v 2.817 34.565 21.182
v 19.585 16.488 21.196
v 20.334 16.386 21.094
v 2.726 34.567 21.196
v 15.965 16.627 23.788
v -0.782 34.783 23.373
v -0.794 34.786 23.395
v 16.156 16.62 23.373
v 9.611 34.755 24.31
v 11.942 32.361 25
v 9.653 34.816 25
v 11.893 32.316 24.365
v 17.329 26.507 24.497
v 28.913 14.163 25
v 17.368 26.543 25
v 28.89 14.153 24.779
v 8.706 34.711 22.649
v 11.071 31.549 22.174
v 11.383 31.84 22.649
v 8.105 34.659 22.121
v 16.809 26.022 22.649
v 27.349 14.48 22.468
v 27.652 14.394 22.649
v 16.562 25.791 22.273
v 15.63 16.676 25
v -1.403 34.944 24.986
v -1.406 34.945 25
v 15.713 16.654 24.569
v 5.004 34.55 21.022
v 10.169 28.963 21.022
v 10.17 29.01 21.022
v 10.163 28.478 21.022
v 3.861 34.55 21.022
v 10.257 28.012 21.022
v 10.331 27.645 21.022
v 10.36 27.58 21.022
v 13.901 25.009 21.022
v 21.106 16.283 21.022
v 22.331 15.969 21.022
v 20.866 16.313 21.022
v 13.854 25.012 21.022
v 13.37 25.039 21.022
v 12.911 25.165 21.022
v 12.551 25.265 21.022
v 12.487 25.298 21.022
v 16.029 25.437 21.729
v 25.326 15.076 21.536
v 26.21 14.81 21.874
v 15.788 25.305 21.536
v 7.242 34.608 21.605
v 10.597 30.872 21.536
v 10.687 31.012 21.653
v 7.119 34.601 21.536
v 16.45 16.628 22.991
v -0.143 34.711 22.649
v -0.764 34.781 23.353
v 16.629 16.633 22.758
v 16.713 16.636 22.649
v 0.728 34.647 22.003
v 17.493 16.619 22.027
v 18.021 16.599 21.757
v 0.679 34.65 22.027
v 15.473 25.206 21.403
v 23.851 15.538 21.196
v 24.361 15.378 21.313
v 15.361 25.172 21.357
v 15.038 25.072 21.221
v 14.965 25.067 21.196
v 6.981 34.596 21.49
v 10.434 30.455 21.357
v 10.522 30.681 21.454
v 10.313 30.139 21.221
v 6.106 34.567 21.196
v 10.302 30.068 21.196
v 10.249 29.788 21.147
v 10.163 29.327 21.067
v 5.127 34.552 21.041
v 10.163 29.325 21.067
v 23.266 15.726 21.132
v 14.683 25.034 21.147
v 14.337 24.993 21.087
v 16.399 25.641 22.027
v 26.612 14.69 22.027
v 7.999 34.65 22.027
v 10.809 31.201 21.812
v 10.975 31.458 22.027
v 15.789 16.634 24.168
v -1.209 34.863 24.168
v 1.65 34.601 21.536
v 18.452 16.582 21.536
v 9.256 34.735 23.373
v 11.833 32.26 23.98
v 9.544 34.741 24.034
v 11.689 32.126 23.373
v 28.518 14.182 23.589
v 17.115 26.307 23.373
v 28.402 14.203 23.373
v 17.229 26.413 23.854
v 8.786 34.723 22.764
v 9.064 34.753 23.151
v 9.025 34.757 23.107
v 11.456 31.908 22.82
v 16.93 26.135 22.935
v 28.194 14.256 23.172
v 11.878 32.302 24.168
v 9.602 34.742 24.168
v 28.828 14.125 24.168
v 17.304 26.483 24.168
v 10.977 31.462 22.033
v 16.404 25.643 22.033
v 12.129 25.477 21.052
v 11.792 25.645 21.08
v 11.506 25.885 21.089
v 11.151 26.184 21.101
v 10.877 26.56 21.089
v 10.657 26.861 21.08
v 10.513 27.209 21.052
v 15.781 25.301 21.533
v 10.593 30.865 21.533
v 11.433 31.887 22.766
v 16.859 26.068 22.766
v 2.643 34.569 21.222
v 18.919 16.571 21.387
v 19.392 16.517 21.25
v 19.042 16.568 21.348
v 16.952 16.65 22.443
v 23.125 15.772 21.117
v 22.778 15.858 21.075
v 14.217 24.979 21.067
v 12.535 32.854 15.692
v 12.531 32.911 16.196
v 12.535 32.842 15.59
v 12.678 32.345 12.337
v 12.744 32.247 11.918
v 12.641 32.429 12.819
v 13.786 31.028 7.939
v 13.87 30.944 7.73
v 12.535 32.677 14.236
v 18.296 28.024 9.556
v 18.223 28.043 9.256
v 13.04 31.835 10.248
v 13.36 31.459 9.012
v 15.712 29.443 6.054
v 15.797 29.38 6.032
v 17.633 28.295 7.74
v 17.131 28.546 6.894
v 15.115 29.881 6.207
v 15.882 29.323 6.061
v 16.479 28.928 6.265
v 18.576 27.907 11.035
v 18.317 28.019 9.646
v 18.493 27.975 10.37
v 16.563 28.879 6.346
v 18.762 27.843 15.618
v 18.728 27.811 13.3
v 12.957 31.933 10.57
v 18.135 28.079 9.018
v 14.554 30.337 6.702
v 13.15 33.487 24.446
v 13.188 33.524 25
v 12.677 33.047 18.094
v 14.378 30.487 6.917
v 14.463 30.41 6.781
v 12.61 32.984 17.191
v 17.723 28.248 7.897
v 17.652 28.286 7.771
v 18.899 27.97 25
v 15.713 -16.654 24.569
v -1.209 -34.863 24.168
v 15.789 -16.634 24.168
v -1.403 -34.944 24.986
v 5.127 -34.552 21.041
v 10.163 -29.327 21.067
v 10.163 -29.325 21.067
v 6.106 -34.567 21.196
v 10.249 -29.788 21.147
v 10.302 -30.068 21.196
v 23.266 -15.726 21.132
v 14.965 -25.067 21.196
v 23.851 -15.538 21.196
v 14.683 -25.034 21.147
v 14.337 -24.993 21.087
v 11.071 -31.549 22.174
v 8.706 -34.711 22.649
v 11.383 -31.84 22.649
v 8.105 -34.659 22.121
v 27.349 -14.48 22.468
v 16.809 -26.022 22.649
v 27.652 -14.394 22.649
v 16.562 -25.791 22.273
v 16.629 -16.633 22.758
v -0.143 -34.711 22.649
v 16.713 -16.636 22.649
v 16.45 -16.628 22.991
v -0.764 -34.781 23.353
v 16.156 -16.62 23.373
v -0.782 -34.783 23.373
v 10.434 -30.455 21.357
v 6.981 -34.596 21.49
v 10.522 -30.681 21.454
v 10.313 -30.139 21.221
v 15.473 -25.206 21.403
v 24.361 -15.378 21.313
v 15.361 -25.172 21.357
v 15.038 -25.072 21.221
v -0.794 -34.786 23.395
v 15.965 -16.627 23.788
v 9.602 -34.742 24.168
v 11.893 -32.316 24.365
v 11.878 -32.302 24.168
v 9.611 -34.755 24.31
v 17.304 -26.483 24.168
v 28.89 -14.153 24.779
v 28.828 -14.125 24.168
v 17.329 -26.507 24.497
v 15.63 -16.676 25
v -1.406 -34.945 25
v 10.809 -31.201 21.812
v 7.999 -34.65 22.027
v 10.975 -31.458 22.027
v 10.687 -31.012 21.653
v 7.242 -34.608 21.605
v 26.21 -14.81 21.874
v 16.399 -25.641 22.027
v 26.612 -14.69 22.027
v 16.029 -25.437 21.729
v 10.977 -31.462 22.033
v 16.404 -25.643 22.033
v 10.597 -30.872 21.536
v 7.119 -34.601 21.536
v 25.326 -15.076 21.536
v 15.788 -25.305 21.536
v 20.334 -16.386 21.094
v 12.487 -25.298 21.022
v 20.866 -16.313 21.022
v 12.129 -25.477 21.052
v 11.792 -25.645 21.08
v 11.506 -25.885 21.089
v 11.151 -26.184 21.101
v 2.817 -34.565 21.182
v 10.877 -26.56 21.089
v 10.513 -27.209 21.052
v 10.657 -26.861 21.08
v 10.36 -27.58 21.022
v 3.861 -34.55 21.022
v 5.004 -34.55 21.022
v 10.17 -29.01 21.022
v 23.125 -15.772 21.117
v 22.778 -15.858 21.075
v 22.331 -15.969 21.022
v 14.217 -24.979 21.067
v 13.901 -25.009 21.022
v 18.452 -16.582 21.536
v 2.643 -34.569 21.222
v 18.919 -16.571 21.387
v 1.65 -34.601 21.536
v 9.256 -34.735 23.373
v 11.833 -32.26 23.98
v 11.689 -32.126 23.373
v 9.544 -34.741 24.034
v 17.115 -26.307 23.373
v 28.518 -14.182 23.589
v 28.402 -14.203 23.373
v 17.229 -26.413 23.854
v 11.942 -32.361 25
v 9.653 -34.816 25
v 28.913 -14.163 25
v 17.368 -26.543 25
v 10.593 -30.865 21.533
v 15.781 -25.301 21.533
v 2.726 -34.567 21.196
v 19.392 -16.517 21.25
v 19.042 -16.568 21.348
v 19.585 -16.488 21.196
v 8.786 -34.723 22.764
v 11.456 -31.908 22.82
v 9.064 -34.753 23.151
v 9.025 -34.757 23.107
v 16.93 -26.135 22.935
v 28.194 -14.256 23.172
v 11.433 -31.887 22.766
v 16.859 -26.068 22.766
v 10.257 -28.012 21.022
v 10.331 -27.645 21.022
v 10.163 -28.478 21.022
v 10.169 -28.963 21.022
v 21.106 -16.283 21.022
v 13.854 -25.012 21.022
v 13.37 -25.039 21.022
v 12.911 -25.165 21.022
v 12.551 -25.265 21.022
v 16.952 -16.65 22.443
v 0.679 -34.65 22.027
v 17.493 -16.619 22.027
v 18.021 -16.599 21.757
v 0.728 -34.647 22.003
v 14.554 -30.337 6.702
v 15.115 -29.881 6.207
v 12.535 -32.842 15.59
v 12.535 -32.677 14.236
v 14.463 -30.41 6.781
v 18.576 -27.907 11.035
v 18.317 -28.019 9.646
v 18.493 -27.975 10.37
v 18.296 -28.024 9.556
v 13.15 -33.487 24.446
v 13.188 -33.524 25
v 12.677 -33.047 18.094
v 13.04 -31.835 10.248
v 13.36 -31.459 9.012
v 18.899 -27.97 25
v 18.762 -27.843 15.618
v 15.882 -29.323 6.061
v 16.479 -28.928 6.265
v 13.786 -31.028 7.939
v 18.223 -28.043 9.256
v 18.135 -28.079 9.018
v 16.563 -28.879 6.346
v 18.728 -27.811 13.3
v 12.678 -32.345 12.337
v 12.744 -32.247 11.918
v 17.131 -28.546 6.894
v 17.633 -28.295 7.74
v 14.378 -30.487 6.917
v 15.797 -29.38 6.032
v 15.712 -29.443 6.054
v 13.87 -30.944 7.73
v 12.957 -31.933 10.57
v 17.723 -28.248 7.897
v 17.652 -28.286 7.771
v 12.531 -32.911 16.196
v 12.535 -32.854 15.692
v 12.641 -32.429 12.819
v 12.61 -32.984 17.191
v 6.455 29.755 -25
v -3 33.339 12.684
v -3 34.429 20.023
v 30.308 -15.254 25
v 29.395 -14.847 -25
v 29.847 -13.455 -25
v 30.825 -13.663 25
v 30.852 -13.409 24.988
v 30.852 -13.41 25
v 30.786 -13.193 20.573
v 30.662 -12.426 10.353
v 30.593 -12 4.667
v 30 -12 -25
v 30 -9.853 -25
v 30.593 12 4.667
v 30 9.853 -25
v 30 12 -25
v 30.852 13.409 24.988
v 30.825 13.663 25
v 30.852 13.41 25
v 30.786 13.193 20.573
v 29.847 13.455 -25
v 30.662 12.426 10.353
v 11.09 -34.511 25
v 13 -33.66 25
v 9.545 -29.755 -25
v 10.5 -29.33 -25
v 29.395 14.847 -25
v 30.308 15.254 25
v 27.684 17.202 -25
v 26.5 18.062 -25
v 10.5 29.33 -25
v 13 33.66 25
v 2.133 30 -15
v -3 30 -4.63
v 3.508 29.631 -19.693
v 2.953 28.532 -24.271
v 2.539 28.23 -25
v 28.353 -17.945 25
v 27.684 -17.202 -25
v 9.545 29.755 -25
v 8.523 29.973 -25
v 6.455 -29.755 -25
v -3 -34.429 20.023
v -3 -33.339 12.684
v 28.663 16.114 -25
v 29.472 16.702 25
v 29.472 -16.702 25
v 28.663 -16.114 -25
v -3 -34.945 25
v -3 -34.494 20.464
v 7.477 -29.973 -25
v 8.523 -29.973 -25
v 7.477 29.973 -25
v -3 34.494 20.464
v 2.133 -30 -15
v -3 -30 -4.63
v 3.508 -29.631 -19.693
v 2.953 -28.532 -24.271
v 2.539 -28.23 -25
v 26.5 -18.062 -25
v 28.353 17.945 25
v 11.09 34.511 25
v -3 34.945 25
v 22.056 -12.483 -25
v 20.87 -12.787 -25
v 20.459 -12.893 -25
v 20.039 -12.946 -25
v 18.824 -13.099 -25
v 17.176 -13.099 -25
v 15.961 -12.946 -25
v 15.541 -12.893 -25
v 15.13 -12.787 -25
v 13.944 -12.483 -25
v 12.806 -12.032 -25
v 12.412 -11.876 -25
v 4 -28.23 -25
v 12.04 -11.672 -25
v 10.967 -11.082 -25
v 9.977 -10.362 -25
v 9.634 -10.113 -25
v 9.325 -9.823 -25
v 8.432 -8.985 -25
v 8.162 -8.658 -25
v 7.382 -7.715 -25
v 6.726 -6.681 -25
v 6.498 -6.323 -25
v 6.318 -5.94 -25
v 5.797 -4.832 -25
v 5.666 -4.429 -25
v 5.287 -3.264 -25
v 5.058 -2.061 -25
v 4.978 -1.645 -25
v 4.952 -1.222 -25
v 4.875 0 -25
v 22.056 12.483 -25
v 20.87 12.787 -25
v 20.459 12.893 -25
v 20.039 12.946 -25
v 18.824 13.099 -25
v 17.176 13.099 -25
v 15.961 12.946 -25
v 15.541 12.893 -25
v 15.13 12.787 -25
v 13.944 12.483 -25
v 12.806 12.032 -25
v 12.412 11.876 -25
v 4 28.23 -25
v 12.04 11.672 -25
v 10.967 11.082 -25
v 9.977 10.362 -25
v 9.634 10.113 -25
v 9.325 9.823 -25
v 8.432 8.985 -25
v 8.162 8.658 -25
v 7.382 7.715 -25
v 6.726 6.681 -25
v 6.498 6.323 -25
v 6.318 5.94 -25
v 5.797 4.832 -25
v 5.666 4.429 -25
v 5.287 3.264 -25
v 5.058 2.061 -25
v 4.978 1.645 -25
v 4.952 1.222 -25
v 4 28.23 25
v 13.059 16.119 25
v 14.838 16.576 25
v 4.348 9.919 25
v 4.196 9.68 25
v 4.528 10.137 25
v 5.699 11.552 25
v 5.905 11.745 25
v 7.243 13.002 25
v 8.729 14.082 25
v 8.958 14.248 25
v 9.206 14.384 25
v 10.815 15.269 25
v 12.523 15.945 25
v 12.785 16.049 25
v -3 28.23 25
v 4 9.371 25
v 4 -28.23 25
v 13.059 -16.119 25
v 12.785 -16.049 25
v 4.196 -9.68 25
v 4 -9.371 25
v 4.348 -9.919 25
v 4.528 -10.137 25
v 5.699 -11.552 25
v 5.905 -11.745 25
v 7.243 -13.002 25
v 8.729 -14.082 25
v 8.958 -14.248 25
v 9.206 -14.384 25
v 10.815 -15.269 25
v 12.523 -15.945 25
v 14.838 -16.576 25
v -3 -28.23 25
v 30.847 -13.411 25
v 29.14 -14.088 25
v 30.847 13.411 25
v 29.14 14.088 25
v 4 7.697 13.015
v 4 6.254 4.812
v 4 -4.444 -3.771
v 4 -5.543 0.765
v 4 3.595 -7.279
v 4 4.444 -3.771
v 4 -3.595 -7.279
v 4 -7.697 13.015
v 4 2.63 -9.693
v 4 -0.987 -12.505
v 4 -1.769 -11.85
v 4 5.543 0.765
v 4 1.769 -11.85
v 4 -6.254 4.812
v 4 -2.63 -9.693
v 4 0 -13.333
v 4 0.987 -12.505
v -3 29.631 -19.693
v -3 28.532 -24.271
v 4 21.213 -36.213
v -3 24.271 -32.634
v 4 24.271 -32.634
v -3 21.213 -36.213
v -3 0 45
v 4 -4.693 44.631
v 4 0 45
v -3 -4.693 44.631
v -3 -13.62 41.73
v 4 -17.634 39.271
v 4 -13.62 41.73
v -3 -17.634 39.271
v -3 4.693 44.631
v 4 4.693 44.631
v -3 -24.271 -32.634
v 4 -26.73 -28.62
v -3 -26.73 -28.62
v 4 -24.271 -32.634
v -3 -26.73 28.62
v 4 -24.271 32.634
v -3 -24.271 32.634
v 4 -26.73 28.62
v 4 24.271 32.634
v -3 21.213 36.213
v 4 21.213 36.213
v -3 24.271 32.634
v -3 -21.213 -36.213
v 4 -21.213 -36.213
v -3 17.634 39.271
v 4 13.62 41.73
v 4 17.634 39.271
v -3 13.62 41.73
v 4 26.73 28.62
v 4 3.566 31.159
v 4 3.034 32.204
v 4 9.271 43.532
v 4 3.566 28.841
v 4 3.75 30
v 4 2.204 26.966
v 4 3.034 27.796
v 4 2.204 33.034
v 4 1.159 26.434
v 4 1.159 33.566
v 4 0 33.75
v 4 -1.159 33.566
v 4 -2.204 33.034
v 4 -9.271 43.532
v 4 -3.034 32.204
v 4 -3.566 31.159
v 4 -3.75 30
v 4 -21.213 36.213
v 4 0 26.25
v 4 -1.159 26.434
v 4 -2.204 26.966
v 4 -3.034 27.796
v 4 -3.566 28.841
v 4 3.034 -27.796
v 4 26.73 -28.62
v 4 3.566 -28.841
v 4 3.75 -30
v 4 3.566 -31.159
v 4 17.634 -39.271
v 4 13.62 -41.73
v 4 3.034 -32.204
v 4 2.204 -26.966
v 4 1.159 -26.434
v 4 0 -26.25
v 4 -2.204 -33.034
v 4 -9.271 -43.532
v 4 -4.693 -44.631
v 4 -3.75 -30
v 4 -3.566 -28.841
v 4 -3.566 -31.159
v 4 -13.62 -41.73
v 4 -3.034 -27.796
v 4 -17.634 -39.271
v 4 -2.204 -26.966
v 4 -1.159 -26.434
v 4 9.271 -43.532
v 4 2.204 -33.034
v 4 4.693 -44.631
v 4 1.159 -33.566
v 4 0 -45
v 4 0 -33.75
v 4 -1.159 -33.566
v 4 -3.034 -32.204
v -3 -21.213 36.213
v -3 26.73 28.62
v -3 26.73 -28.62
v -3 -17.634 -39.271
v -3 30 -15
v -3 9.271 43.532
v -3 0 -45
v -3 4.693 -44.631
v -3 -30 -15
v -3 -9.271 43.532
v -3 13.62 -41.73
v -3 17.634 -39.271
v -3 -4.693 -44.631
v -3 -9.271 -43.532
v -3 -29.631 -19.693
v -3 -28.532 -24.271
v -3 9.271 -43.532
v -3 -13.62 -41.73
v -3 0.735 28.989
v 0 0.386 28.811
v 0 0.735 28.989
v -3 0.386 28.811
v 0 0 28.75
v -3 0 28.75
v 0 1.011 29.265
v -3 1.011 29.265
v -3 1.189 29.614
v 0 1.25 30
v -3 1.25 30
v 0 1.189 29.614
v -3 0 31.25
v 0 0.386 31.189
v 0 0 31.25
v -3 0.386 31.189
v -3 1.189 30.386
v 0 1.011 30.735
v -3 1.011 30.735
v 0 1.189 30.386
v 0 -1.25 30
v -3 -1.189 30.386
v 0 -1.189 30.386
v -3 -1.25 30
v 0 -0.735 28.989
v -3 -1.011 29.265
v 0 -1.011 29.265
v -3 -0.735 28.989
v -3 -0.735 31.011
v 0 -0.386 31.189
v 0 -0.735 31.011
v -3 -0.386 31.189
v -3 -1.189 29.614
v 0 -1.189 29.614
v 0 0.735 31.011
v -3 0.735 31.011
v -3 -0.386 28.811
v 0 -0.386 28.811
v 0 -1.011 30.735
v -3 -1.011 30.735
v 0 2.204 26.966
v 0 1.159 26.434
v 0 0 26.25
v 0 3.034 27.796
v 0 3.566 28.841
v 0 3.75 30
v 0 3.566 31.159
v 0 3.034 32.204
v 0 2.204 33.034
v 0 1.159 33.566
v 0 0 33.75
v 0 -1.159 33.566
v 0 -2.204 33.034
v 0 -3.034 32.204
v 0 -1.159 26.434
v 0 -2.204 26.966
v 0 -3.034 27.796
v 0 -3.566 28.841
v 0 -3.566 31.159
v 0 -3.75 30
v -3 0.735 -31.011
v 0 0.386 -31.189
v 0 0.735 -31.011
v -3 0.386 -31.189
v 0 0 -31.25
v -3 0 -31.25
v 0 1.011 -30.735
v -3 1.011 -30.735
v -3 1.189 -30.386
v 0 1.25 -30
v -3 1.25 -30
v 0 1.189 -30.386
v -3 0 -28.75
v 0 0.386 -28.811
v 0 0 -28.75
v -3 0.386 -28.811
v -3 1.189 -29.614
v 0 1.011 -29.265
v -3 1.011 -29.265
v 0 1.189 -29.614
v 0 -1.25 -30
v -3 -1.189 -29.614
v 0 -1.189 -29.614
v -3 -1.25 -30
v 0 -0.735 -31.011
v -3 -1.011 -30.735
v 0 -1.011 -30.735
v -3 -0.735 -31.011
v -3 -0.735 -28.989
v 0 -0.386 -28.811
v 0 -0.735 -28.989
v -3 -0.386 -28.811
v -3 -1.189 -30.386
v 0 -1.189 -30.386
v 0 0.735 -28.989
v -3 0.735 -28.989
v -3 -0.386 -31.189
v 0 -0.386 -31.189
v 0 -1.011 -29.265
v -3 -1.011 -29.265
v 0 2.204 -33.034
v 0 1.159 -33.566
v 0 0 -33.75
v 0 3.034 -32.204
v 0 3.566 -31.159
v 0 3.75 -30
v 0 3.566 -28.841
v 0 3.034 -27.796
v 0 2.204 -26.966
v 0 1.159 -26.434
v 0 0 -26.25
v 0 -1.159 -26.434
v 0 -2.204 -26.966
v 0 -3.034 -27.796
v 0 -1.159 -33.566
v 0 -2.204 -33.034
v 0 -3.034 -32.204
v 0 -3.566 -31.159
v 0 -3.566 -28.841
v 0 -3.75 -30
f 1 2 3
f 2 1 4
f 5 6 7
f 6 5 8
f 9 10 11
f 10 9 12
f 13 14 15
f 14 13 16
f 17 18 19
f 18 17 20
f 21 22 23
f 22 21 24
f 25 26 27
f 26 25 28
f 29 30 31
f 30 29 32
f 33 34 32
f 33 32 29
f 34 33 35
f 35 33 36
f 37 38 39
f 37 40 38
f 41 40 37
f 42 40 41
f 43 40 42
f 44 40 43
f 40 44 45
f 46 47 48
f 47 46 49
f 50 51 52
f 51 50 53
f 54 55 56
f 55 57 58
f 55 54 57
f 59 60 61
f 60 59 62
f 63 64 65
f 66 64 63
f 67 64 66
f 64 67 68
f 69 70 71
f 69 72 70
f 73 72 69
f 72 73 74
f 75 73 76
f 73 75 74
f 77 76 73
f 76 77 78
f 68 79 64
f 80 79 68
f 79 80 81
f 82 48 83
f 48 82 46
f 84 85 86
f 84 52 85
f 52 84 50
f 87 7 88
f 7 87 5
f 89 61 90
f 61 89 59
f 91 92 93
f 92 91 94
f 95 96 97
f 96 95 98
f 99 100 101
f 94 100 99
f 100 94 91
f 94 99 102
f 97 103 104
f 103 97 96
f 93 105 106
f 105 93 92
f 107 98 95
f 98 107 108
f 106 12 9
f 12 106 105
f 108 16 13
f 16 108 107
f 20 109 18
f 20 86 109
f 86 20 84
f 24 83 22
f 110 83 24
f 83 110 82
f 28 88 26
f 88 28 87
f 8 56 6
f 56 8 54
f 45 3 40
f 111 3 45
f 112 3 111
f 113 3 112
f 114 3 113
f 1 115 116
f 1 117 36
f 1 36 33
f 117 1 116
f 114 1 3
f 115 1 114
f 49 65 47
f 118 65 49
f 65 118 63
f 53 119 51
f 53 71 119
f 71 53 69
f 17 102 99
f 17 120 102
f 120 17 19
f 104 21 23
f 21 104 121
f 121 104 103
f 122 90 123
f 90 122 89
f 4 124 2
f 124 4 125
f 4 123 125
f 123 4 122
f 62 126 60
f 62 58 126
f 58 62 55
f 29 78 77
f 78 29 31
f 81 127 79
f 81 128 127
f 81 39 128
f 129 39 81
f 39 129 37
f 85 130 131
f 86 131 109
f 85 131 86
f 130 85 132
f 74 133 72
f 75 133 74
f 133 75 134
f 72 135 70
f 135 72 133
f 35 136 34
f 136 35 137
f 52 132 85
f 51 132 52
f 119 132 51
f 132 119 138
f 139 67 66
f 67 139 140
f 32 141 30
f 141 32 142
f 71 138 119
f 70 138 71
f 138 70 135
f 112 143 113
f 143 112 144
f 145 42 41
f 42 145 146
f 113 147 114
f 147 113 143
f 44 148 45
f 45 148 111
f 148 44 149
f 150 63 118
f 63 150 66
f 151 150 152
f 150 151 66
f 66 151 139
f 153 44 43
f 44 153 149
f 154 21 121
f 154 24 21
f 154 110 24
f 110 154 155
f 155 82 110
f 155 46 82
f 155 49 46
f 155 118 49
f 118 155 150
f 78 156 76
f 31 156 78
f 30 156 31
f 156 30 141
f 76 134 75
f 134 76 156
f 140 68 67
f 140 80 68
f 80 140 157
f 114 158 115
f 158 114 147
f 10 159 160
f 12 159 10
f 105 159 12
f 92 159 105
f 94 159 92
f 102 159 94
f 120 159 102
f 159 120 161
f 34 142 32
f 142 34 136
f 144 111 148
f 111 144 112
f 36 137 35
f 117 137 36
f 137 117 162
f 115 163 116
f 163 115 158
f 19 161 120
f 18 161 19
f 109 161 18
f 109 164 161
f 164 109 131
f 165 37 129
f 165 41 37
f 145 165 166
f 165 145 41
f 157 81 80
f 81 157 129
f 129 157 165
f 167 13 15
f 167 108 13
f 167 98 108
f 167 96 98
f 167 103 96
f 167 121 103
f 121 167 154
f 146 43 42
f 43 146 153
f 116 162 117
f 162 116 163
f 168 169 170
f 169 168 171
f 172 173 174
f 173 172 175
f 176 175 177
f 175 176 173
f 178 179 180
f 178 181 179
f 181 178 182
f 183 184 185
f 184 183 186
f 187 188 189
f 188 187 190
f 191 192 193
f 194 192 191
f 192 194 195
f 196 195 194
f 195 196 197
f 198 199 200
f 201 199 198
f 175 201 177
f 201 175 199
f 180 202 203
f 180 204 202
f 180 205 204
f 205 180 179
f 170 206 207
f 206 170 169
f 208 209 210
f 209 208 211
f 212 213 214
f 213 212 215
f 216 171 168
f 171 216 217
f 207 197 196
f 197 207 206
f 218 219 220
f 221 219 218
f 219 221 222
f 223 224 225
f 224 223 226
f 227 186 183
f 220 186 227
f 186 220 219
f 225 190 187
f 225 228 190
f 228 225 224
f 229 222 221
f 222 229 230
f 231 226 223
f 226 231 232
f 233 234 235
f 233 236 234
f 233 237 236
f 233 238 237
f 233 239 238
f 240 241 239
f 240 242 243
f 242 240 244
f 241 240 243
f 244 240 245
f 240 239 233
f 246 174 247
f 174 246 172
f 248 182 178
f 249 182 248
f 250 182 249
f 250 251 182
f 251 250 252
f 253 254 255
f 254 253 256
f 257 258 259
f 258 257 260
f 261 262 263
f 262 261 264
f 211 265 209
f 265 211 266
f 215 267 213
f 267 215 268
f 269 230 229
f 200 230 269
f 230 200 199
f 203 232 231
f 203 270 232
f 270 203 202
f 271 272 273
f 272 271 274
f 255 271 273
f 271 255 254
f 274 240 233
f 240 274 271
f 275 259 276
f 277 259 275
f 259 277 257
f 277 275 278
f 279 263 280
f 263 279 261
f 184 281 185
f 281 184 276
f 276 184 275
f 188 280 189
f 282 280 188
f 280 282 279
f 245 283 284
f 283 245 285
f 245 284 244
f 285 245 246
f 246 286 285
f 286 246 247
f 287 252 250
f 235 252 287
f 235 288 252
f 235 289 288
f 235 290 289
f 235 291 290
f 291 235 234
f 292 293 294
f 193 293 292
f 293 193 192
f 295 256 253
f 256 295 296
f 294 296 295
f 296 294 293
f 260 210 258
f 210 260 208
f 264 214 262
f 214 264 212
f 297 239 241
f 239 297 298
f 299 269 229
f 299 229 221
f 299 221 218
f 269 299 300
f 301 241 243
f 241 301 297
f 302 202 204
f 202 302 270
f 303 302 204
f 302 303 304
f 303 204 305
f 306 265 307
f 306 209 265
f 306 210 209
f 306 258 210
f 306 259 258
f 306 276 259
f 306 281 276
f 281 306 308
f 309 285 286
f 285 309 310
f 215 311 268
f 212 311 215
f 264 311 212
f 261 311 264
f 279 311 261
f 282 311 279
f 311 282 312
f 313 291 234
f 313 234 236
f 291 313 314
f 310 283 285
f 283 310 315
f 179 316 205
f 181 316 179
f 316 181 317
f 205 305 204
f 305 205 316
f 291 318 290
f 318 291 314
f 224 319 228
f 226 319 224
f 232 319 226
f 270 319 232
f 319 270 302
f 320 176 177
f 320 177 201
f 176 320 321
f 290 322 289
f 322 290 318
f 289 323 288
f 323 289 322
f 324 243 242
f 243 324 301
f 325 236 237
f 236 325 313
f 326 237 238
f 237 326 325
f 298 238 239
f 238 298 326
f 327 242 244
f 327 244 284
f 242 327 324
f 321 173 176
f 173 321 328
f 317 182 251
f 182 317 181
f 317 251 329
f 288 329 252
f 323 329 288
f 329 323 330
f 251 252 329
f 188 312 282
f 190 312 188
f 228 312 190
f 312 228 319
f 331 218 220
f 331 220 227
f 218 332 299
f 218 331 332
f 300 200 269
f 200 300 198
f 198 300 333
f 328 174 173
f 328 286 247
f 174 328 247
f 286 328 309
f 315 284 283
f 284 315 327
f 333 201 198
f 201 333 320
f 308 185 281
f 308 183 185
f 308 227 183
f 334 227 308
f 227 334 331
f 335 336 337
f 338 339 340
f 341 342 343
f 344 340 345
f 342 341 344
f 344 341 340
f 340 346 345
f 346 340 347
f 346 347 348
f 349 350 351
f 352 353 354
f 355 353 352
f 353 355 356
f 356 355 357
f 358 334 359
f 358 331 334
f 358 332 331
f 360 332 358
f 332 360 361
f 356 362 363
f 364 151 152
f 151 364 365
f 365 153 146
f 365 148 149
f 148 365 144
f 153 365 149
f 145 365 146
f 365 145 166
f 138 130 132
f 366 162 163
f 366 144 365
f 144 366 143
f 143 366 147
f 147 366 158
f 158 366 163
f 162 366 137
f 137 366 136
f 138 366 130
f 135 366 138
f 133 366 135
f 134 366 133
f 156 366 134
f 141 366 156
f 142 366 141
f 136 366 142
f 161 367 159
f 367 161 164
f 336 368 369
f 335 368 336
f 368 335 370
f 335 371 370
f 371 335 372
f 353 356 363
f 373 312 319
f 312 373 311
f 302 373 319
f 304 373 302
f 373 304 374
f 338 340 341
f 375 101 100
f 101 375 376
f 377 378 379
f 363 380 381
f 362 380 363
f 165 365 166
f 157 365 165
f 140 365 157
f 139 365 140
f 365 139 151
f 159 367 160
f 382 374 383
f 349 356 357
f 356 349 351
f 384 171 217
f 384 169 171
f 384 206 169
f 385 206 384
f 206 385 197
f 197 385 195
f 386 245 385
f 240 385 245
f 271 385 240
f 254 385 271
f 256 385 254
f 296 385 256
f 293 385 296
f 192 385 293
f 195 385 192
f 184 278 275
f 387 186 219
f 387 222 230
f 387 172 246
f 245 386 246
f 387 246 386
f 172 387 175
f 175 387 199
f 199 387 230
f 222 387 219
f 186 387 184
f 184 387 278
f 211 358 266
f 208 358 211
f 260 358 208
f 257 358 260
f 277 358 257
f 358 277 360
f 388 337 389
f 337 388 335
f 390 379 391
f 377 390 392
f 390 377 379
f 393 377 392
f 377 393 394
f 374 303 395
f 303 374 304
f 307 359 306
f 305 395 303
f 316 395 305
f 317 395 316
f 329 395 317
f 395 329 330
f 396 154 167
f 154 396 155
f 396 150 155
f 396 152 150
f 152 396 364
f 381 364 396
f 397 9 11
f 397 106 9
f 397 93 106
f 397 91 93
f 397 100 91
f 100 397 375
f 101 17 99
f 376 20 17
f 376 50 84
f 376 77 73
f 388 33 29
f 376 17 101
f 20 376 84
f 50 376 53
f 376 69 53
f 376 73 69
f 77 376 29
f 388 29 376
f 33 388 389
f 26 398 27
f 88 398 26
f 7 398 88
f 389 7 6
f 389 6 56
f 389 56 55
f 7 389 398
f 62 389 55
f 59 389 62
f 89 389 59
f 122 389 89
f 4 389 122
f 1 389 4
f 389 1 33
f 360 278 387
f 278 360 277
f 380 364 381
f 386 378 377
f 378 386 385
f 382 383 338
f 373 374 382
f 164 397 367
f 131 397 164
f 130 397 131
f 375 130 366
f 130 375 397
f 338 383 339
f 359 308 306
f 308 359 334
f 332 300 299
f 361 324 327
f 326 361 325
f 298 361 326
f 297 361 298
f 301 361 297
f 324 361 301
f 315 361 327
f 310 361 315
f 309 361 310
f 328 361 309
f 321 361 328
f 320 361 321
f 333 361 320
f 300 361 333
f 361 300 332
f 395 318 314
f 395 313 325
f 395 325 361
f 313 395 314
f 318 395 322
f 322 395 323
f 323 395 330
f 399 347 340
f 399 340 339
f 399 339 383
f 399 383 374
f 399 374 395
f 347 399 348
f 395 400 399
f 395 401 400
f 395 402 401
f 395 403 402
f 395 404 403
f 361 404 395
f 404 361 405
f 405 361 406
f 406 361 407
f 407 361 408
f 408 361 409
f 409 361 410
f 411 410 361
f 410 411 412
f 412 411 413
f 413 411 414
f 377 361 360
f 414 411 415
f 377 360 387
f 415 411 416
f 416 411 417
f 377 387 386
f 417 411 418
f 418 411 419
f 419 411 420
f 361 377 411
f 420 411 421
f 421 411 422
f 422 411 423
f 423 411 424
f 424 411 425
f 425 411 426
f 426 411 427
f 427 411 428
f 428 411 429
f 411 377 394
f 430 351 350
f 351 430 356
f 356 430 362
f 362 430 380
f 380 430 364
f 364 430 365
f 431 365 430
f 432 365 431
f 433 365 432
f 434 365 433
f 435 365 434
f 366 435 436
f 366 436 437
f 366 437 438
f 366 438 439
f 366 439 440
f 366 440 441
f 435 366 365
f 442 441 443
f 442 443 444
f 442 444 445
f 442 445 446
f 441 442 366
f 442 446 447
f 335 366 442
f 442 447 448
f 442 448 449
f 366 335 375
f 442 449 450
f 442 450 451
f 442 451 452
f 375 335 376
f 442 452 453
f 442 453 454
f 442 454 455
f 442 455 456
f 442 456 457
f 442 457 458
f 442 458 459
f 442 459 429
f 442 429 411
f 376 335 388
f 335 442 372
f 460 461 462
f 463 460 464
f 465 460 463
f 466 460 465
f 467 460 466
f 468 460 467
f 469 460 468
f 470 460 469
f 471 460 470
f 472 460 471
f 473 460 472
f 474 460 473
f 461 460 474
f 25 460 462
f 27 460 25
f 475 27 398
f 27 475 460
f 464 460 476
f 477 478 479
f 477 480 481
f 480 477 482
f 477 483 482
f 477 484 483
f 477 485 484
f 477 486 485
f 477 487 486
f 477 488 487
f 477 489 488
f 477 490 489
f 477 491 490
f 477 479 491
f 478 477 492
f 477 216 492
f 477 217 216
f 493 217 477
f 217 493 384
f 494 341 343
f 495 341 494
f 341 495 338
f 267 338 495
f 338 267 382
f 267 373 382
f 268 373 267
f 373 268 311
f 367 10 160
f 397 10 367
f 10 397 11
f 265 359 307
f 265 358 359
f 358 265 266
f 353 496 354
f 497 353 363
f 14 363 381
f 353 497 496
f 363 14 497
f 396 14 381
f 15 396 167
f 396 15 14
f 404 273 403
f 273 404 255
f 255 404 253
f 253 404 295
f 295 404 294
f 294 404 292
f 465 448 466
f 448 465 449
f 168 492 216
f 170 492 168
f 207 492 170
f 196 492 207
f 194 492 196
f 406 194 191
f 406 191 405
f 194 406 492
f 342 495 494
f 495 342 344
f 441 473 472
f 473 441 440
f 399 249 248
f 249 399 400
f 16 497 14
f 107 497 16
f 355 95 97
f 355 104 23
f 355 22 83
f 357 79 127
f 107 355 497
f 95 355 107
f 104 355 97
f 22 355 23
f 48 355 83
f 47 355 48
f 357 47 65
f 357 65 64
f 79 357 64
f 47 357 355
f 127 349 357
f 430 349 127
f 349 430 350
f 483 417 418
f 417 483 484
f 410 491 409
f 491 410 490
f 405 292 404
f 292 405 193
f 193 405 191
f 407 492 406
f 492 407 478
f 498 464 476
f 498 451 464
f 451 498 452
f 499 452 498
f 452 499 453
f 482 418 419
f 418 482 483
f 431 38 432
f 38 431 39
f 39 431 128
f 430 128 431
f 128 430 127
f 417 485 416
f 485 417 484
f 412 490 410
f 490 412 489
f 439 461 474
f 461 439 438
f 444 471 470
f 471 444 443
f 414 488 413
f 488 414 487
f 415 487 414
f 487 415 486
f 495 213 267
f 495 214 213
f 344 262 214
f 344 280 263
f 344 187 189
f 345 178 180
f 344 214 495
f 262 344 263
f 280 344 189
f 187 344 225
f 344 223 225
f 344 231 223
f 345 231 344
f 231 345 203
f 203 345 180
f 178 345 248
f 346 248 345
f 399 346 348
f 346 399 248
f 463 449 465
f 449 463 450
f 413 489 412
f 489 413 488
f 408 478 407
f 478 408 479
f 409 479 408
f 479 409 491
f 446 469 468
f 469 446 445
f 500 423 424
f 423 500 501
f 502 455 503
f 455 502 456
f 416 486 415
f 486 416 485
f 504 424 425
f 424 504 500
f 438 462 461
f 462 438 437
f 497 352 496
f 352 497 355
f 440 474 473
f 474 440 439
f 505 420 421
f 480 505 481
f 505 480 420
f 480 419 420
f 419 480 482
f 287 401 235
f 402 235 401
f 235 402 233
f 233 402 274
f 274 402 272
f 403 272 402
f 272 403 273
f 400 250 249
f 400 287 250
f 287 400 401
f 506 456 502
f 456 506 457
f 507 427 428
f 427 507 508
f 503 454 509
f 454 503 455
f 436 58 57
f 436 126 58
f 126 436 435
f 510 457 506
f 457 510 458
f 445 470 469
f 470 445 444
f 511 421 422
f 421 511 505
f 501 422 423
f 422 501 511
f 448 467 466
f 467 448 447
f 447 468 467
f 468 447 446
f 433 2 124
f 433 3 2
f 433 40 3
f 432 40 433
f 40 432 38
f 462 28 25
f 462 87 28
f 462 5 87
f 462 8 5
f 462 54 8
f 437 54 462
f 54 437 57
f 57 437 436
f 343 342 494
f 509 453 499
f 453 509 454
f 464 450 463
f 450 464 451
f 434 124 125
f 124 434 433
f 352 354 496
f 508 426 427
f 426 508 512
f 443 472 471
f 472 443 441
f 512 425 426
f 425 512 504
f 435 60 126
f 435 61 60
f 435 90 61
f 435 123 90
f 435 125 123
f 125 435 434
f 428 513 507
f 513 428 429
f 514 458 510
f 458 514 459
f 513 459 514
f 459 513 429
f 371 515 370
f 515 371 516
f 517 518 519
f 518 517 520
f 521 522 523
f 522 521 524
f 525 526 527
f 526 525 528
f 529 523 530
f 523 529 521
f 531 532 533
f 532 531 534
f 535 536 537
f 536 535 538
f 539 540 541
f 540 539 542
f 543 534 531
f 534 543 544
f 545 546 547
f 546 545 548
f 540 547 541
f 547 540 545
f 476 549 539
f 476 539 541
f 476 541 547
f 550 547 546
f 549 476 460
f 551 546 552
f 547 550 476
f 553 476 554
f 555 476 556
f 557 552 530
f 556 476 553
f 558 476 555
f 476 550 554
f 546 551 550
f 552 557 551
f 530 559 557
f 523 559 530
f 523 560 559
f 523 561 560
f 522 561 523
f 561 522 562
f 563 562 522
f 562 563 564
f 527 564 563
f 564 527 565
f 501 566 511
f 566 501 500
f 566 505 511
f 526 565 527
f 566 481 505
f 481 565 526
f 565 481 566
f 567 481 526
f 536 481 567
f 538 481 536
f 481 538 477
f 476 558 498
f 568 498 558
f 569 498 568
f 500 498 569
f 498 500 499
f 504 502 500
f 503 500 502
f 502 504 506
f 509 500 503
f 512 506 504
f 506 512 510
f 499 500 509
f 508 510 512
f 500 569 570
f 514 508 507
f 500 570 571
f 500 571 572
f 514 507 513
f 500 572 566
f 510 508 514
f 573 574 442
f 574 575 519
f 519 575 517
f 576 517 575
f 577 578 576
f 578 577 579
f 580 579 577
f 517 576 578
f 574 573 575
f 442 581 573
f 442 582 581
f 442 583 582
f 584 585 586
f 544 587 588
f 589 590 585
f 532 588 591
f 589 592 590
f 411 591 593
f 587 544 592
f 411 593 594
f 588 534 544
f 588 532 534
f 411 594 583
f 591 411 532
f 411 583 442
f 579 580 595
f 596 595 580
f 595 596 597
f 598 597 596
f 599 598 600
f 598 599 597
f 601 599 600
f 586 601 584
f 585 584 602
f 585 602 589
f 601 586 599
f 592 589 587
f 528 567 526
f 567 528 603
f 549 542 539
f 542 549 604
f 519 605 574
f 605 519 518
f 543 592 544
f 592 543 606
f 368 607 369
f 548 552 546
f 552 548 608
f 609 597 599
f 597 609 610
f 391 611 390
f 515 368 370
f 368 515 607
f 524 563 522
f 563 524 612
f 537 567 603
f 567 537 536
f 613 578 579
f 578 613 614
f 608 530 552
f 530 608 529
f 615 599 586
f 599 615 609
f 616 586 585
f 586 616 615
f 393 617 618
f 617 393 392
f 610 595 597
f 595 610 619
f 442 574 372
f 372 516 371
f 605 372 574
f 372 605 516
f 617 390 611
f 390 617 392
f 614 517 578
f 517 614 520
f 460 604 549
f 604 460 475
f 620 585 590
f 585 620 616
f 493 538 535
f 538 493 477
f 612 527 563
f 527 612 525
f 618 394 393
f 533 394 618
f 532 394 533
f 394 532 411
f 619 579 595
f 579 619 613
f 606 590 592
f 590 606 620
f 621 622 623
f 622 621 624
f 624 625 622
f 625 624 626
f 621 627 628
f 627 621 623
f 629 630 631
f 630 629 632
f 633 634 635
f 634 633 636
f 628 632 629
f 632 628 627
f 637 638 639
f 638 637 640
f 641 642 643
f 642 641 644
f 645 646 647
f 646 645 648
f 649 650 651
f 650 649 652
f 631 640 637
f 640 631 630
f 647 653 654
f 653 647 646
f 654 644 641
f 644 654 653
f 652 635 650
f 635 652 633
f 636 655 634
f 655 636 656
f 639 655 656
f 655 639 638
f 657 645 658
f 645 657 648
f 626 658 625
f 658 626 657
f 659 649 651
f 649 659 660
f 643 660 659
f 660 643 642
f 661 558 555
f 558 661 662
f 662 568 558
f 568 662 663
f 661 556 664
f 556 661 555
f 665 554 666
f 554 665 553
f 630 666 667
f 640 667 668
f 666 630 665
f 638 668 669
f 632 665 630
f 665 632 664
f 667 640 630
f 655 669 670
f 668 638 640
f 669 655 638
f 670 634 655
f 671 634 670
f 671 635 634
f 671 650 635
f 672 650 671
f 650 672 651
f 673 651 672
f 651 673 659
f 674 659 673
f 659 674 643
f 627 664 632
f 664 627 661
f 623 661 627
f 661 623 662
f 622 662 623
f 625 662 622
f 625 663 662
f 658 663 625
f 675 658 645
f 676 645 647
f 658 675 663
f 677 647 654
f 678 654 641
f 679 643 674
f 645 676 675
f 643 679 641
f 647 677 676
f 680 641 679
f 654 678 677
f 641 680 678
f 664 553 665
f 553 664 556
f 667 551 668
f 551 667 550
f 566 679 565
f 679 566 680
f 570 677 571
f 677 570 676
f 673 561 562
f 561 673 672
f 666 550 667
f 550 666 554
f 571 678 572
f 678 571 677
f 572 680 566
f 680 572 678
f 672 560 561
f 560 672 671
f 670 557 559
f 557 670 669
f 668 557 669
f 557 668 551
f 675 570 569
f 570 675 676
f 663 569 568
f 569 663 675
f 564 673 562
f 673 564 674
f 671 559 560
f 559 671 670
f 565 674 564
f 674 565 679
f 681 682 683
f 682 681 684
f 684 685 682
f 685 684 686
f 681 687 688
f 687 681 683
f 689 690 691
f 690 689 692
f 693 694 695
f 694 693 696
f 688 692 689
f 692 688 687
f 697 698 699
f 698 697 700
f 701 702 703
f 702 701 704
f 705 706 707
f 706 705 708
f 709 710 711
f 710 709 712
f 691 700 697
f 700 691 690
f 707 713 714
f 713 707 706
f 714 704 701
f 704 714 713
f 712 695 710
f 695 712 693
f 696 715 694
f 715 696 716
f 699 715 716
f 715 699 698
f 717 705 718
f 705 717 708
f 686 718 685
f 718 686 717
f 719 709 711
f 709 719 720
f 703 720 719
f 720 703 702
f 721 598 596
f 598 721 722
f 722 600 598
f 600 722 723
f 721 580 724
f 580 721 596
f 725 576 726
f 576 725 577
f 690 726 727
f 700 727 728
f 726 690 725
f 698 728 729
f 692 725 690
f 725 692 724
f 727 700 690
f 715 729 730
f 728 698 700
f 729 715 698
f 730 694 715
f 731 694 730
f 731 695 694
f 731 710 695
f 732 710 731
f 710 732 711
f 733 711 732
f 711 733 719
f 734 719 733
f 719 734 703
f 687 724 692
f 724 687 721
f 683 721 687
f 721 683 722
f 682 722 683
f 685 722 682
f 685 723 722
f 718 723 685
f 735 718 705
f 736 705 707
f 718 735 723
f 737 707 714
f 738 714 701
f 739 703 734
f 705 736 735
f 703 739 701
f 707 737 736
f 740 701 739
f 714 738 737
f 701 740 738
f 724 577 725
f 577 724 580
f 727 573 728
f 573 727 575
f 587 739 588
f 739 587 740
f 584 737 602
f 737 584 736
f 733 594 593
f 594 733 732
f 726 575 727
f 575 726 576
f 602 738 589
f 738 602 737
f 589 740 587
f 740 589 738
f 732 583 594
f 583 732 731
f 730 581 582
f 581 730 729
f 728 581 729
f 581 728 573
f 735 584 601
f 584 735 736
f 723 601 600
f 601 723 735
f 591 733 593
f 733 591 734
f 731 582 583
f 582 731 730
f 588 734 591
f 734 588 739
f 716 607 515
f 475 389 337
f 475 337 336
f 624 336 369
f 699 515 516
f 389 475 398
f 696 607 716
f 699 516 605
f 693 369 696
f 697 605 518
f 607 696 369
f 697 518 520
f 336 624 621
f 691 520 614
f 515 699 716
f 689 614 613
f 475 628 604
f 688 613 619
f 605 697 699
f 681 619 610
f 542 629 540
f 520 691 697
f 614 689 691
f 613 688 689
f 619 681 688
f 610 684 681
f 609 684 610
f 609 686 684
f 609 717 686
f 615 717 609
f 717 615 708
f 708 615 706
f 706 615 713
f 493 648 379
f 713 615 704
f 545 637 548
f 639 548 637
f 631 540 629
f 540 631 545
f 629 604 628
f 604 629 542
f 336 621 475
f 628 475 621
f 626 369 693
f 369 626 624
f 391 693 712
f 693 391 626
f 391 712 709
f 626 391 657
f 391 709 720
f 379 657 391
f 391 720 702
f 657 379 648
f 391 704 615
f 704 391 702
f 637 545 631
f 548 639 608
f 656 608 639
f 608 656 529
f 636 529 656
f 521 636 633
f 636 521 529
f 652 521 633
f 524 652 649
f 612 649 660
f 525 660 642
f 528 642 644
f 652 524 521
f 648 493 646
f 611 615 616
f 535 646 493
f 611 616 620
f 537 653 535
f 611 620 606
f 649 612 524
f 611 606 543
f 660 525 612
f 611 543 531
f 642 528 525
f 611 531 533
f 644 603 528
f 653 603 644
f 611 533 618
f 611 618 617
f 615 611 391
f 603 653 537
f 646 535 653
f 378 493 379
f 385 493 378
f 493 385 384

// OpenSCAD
module trou_de_vis(){
    rotate([0,90,0]){
        cylinder(r=1.25,h=50, center=true, $fn=20);
        translate([0,0,10]) cylinder(r=3.75,h=20, center=true, $fn=20);
    }
}

module corp_support(){
    difference(){
        hull(){
            translate([-6,25,0]) cylinder(r2=10,r1=1,h=50, center=true, $fn=30);
            translate([-6,-25,0]) cylinder(r2=10,r1=1,h=50, center=true, $fn=30);
            translate([5,25,0]) cylinder(r2=10,r1=5,h=50, center=true, $fn=30);
            translate([5,-25,0]) cylinder(r2=10,r1=5,h=50, center=true, $fn=30);
            translate([20,12,0]) cylinder(r2=8,r1=7,h=50, center=true, $fn=30);
            translate([20,-12,0]) cylinder(r2=8,r1=7,h=50, center=true, $fn=30);
        }
        hull(){
            translate([15,0,0]) cylinder(r2=18,r1=12,h=80, center=true, $fn=50);
            translate([50,0,0]) cylinder(r2=5,r1=1,h=80, center=true, $fn=50);
        }
        for(i=[1,-1]){
            translate([15,20*i,25]) rotate([90,0,43*i]) cylinder(r=4,h=50, center=true, $fn=30);
            hull(){
                translate([15,23*i,25]) rotate([0,-20,43*i]){ 
                    translate([0,7*i,0])cylinder(r=4,h=50, center=true, $fn=30);      
                    translate([10,7*i,0]) cylinder(r=4,h=50, center=true, $fn=30);      
                }
            }     
        }
    }
}
module dos(){
    hull(){
        for(i=[1,-1]){
            translate([-1,0,15*i]) rotate([0,90,0]) cylinder(r=30,h=10,center=true,$fn=40);
        }
    }
}
difference(){
    union(){
        //cube([7.5,50,80], center=true);    
        translate([3,0,0]) corp_support();
        dos();
    }
    translate([0,0,30]) trou_de_vis();
    translate([0,0,-30]) trou_de_vis();
    translate([-8,0,0]) cube([10,100,100], center=true); 
    
}
